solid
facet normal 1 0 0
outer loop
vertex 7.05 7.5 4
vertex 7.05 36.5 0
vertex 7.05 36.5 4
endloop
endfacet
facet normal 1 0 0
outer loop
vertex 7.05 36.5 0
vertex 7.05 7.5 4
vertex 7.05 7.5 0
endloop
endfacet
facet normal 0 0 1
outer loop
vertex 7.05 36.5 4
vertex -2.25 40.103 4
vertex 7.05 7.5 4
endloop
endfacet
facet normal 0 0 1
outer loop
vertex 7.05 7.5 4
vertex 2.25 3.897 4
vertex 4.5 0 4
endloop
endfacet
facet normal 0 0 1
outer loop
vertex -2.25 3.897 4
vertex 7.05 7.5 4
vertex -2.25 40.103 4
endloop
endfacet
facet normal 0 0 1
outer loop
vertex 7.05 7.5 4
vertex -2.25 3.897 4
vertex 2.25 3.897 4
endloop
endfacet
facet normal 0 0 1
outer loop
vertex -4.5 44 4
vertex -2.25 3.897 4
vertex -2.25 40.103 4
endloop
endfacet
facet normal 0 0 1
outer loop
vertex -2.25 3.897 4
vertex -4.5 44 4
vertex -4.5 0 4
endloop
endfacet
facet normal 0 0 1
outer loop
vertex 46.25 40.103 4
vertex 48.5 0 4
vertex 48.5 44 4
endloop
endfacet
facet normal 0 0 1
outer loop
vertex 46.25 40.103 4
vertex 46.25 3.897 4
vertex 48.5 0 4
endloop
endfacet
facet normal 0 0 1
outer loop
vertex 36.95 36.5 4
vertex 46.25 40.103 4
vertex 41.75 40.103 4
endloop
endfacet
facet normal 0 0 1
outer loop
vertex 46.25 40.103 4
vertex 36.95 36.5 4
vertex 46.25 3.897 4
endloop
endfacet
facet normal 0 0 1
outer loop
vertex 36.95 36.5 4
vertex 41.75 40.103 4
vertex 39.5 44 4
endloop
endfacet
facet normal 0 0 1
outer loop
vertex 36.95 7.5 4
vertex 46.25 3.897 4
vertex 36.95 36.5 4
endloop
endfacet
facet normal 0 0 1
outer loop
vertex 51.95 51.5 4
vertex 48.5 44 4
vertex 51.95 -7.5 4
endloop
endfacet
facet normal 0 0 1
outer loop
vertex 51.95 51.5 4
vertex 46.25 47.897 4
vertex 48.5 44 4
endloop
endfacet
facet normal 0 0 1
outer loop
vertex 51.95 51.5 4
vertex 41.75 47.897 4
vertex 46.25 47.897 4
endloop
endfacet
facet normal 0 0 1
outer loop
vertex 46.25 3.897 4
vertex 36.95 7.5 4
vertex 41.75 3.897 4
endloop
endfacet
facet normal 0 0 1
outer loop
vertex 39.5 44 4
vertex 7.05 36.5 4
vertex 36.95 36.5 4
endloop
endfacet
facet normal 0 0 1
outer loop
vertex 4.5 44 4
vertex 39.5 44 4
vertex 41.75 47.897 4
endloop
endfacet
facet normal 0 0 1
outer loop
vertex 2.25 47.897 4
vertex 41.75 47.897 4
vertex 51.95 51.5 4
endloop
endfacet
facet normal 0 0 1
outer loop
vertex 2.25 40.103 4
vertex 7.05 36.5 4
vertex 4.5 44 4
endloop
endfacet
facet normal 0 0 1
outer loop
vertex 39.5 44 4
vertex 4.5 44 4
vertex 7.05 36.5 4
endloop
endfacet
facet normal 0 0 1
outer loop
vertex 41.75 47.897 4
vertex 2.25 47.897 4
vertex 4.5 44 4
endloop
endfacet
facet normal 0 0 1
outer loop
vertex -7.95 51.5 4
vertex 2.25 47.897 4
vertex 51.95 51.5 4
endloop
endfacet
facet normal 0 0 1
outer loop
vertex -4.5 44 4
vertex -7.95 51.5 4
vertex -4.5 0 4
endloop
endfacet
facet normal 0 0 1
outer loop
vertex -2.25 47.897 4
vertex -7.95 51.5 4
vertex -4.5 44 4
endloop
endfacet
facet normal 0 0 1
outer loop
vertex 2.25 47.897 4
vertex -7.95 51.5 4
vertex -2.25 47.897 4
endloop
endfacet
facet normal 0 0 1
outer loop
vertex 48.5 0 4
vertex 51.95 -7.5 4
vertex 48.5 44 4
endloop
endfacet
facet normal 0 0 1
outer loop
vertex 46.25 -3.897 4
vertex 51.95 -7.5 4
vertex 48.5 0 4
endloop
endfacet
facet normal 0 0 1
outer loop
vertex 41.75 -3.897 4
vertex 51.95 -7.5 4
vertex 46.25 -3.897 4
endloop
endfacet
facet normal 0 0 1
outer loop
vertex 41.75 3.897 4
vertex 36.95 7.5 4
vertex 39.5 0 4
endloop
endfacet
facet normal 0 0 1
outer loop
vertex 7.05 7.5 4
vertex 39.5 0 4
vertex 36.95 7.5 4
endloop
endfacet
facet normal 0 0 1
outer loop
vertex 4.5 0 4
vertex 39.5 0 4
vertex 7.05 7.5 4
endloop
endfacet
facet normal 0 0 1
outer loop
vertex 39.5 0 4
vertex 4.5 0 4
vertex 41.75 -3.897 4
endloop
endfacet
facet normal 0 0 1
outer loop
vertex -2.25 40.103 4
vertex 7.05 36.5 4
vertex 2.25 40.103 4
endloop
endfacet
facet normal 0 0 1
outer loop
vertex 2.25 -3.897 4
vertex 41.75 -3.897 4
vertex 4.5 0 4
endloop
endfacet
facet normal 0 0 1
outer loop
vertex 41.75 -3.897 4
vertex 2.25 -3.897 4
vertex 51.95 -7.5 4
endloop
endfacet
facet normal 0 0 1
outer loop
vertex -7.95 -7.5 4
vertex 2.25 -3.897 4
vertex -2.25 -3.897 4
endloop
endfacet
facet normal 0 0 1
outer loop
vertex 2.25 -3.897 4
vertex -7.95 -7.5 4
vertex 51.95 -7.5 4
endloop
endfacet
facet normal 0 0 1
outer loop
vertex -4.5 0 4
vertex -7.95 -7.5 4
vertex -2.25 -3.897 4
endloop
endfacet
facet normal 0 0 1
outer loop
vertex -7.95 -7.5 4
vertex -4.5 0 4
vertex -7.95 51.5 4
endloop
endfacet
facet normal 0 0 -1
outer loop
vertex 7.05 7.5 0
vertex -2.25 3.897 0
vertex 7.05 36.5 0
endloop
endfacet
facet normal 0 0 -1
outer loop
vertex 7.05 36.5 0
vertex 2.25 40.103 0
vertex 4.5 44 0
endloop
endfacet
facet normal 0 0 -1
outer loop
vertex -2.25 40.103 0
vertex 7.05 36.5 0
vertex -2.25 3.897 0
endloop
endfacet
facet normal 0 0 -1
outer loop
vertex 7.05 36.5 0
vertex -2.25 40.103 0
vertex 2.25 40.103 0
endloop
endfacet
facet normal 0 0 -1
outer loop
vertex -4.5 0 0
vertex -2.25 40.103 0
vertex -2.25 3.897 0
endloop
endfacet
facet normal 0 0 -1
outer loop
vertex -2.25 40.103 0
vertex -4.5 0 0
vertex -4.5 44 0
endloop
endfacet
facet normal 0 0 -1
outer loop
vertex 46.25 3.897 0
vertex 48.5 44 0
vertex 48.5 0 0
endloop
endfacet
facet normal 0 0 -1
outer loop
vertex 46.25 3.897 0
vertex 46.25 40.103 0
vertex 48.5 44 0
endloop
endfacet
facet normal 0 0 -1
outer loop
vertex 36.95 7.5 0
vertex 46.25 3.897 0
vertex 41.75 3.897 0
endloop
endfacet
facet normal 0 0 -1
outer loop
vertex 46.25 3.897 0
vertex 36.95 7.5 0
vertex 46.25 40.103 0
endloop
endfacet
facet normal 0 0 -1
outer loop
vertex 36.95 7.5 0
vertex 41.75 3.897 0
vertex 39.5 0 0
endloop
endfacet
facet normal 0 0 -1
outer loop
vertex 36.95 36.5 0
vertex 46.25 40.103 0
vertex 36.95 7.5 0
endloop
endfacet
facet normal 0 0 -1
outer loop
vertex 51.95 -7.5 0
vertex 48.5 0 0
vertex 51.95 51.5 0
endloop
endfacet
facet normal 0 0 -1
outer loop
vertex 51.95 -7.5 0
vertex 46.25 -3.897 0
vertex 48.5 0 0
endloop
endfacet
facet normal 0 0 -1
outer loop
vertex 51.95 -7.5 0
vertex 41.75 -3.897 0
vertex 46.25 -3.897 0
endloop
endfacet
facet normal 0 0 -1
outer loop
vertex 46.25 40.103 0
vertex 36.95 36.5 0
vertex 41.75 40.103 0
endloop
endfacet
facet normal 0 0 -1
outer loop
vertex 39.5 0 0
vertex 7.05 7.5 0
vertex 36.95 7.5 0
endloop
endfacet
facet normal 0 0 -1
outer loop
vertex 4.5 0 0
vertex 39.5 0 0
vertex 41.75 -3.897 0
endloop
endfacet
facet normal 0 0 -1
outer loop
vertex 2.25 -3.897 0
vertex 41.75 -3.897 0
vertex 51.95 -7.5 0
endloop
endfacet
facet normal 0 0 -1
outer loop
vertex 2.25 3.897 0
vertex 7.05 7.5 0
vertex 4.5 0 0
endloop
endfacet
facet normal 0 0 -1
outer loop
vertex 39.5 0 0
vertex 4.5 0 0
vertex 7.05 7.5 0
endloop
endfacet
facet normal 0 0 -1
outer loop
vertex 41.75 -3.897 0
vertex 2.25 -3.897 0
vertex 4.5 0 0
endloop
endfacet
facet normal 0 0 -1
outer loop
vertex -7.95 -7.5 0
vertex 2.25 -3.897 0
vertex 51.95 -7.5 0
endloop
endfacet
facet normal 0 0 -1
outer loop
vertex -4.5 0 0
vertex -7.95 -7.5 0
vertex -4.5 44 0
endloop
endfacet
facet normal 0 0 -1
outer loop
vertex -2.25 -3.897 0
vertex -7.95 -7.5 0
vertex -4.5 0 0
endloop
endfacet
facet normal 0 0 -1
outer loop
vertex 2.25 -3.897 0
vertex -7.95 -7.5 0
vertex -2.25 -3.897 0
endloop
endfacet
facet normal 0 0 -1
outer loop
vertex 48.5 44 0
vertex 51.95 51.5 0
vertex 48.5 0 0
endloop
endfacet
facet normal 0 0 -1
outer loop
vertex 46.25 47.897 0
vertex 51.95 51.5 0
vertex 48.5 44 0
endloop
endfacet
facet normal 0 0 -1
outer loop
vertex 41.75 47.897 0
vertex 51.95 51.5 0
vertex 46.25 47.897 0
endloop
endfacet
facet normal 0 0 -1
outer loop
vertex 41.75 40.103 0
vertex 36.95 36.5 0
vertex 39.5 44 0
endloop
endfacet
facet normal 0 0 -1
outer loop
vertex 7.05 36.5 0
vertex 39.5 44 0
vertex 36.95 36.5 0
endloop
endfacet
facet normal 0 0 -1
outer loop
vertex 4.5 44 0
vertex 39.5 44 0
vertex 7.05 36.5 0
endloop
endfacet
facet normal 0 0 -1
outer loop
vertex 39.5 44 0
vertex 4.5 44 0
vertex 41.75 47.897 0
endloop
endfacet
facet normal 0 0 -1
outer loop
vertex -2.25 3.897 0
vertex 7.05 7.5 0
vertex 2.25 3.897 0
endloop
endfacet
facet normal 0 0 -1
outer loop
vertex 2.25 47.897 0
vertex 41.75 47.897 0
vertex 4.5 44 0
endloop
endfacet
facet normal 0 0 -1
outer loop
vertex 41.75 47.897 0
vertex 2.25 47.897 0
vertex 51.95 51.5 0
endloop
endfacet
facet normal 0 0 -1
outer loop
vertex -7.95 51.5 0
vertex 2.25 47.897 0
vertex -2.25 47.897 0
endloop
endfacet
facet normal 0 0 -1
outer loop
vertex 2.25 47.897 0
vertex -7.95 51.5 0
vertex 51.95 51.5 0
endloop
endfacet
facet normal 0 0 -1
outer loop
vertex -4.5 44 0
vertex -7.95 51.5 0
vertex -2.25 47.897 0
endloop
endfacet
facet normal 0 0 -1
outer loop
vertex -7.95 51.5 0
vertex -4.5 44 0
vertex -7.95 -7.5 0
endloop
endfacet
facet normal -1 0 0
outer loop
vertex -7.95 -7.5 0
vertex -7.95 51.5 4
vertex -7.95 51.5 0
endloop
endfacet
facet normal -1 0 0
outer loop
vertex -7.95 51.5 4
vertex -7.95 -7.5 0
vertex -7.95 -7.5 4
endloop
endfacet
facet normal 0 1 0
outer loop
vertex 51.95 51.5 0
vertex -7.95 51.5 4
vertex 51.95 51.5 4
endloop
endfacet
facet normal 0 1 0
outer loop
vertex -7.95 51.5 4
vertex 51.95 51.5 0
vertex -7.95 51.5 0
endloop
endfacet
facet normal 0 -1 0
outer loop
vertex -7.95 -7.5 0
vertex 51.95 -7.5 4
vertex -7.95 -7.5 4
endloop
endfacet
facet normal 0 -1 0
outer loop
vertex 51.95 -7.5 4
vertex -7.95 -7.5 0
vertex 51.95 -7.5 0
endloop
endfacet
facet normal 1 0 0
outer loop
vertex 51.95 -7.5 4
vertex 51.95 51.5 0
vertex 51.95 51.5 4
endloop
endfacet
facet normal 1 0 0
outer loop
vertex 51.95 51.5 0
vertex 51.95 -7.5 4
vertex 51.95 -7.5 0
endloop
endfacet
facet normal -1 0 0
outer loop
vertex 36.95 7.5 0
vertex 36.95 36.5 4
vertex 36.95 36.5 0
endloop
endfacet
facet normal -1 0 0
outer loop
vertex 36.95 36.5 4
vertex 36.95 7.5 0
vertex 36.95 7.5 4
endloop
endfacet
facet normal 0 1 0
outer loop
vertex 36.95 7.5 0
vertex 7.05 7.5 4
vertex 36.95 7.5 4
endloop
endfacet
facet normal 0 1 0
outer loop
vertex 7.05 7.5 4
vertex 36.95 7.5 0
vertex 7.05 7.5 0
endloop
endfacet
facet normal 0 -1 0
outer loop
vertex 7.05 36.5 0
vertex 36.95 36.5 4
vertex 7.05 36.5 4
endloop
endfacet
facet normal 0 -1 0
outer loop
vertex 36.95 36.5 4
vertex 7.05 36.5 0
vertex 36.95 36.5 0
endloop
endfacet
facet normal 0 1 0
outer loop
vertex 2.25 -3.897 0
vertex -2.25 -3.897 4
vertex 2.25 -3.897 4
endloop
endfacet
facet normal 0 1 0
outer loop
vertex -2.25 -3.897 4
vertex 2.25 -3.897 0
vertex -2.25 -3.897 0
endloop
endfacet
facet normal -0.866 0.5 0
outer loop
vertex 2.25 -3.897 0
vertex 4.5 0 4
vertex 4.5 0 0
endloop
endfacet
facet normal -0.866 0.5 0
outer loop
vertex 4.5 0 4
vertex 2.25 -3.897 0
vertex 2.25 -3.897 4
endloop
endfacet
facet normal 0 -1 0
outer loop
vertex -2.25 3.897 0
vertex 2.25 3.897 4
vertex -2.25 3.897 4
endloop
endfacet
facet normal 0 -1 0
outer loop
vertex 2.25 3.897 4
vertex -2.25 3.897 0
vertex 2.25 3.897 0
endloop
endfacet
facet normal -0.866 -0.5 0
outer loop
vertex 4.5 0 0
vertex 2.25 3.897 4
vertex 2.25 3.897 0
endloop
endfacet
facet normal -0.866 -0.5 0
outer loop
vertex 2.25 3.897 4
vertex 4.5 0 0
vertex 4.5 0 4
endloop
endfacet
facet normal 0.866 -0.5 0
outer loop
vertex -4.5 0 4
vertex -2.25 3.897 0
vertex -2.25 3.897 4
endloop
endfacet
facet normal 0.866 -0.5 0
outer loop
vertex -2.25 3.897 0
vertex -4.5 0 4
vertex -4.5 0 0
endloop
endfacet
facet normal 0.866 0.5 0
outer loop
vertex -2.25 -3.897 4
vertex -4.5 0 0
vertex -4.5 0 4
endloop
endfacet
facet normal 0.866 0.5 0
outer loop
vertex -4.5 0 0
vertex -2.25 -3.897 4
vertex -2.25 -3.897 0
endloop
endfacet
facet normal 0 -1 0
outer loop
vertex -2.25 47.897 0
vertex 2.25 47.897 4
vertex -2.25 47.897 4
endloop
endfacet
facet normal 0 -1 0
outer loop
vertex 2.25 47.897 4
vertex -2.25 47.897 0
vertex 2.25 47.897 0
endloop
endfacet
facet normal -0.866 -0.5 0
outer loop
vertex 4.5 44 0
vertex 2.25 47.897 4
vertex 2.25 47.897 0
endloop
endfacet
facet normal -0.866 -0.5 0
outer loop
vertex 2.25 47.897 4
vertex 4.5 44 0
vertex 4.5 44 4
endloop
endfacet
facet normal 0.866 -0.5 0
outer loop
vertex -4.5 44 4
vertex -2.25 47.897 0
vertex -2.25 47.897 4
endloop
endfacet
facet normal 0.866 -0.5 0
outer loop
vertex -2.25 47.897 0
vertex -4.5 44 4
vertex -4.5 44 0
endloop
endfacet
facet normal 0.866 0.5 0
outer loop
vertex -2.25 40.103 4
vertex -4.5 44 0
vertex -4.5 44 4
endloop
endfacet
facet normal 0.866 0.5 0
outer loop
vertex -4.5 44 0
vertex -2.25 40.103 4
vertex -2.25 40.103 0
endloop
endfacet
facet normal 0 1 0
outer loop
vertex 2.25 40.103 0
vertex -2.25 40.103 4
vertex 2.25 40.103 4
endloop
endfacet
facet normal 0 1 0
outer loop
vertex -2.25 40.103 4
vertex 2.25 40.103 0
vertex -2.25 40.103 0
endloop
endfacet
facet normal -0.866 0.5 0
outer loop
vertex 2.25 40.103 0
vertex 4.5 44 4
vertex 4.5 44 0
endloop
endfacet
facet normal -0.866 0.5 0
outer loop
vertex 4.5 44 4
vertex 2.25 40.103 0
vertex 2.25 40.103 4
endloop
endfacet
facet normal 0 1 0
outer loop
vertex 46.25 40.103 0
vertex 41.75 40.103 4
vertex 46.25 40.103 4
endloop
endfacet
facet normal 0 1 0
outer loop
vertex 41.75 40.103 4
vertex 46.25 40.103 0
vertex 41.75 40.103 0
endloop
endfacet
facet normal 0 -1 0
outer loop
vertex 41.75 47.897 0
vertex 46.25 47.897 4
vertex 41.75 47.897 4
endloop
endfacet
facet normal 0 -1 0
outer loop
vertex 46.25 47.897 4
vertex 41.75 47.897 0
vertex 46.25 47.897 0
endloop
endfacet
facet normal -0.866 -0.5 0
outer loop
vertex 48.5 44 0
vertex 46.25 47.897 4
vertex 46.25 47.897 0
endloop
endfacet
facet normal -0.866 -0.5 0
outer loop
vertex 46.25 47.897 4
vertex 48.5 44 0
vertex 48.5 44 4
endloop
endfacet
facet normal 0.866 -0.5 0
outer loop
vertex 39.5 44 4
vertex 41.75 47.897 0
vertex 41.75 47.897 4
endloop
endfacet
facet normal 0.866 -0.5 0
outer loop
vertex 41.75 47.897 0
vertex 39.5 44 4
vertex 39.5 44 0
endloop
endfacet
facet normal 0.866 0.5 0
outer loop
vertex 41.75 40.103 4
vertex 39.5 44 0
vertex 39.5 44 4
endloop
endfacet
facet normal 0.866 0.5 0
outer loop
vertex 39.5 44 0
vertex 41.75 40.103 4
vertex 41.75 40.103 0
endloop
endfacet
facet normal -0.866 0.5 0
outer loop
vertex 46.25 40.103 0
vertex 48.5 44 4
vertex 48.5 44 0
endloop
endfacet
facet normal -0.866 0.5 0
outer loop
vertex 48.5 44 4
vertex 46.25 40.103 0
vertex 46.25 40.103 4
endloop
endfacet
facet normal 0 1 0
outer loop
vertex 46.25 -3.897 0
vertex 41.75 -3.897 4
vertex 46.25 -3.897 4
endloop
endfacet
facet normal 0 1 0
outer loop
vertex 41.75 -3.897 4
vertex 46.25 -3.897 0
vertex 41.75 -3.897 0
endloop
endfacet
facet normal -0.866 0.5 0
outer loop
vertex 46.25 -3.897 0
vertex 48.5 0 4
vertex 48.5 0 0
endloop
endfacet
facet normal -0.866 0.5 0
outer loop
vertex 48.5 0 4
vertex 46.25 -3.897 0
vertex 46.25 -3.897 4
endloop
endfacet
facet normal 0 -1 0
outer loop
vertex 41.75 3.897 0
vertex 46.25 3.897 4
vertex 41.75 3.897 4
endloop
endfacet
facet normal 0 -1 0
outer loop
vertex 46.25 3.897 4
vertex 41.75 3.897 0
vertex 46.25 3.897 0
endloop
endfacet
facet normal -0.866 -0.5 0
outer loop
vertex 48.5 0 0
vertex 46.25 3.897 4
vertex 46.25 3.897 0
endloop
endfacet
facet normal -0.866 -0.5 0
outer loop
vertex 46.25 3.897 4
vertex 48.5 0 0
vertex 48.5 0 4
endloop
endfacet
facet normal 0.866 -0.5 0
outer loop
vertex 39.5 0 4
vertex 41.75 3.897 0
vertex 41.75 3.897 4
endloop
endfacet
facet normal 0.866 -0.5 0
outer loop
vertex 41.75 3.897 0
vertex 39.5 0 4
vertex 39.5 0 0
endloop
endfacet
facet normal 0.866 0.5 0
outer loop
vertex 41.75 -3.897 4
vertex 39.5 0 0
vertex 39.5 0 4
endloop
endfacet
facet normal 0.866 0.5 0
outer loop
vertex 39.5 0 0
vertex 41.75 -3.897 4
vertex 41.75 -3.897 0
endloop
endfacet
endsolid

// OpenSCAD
make();
module make(){
  ofs=44;
  span=44*sqrt(2);
  pad=3;
  
  dia=9; 
	hi = 4;
  smi=0.1;
difference(){
  union(){
	//left
    translate([-(dia/2*1.1+pad),-(dia/2+pad),0]) cube([dia+pad*2,dia+pad*2+ofs,hi]);
    //right
    translate([ofs-(dia/2*0.9+pad),-(dia/2+pad),0]) cube([dia+pad*2,dia+pad*2+ofs,hi]);
    //bottom
    translate([-(dia/2+pad),-(dia/2+pad),0]) cube([dia+pad*2+ofs,dia+pad*2,hi]);
    //top
    translate([-(dia/2+pad),ofs-(dia/2+pad),0]) cube([dia+pad*2+ofs,dia+pad*2,hi]);
  }

  translate([0,0,-smi/2]) cylinder(r = dia/2,h = hi+smi, $fn=6);
  translate([0,ofs,-smi/2]) cylinder(r = dia/2,h = hi+smi, $fn=6);
  translate([ofs,ofs,-smi/2]) cylinder(r = dia/2,h = hi+smi, $fn=6);
  translate([ofs,0,-smi/2]) cylinder(r = dia/2,h = hi+smi, $fn=6);
}
//   cube([dia,dia,1],center=true);
//   cube([dia,dia,1],center=true);
}
